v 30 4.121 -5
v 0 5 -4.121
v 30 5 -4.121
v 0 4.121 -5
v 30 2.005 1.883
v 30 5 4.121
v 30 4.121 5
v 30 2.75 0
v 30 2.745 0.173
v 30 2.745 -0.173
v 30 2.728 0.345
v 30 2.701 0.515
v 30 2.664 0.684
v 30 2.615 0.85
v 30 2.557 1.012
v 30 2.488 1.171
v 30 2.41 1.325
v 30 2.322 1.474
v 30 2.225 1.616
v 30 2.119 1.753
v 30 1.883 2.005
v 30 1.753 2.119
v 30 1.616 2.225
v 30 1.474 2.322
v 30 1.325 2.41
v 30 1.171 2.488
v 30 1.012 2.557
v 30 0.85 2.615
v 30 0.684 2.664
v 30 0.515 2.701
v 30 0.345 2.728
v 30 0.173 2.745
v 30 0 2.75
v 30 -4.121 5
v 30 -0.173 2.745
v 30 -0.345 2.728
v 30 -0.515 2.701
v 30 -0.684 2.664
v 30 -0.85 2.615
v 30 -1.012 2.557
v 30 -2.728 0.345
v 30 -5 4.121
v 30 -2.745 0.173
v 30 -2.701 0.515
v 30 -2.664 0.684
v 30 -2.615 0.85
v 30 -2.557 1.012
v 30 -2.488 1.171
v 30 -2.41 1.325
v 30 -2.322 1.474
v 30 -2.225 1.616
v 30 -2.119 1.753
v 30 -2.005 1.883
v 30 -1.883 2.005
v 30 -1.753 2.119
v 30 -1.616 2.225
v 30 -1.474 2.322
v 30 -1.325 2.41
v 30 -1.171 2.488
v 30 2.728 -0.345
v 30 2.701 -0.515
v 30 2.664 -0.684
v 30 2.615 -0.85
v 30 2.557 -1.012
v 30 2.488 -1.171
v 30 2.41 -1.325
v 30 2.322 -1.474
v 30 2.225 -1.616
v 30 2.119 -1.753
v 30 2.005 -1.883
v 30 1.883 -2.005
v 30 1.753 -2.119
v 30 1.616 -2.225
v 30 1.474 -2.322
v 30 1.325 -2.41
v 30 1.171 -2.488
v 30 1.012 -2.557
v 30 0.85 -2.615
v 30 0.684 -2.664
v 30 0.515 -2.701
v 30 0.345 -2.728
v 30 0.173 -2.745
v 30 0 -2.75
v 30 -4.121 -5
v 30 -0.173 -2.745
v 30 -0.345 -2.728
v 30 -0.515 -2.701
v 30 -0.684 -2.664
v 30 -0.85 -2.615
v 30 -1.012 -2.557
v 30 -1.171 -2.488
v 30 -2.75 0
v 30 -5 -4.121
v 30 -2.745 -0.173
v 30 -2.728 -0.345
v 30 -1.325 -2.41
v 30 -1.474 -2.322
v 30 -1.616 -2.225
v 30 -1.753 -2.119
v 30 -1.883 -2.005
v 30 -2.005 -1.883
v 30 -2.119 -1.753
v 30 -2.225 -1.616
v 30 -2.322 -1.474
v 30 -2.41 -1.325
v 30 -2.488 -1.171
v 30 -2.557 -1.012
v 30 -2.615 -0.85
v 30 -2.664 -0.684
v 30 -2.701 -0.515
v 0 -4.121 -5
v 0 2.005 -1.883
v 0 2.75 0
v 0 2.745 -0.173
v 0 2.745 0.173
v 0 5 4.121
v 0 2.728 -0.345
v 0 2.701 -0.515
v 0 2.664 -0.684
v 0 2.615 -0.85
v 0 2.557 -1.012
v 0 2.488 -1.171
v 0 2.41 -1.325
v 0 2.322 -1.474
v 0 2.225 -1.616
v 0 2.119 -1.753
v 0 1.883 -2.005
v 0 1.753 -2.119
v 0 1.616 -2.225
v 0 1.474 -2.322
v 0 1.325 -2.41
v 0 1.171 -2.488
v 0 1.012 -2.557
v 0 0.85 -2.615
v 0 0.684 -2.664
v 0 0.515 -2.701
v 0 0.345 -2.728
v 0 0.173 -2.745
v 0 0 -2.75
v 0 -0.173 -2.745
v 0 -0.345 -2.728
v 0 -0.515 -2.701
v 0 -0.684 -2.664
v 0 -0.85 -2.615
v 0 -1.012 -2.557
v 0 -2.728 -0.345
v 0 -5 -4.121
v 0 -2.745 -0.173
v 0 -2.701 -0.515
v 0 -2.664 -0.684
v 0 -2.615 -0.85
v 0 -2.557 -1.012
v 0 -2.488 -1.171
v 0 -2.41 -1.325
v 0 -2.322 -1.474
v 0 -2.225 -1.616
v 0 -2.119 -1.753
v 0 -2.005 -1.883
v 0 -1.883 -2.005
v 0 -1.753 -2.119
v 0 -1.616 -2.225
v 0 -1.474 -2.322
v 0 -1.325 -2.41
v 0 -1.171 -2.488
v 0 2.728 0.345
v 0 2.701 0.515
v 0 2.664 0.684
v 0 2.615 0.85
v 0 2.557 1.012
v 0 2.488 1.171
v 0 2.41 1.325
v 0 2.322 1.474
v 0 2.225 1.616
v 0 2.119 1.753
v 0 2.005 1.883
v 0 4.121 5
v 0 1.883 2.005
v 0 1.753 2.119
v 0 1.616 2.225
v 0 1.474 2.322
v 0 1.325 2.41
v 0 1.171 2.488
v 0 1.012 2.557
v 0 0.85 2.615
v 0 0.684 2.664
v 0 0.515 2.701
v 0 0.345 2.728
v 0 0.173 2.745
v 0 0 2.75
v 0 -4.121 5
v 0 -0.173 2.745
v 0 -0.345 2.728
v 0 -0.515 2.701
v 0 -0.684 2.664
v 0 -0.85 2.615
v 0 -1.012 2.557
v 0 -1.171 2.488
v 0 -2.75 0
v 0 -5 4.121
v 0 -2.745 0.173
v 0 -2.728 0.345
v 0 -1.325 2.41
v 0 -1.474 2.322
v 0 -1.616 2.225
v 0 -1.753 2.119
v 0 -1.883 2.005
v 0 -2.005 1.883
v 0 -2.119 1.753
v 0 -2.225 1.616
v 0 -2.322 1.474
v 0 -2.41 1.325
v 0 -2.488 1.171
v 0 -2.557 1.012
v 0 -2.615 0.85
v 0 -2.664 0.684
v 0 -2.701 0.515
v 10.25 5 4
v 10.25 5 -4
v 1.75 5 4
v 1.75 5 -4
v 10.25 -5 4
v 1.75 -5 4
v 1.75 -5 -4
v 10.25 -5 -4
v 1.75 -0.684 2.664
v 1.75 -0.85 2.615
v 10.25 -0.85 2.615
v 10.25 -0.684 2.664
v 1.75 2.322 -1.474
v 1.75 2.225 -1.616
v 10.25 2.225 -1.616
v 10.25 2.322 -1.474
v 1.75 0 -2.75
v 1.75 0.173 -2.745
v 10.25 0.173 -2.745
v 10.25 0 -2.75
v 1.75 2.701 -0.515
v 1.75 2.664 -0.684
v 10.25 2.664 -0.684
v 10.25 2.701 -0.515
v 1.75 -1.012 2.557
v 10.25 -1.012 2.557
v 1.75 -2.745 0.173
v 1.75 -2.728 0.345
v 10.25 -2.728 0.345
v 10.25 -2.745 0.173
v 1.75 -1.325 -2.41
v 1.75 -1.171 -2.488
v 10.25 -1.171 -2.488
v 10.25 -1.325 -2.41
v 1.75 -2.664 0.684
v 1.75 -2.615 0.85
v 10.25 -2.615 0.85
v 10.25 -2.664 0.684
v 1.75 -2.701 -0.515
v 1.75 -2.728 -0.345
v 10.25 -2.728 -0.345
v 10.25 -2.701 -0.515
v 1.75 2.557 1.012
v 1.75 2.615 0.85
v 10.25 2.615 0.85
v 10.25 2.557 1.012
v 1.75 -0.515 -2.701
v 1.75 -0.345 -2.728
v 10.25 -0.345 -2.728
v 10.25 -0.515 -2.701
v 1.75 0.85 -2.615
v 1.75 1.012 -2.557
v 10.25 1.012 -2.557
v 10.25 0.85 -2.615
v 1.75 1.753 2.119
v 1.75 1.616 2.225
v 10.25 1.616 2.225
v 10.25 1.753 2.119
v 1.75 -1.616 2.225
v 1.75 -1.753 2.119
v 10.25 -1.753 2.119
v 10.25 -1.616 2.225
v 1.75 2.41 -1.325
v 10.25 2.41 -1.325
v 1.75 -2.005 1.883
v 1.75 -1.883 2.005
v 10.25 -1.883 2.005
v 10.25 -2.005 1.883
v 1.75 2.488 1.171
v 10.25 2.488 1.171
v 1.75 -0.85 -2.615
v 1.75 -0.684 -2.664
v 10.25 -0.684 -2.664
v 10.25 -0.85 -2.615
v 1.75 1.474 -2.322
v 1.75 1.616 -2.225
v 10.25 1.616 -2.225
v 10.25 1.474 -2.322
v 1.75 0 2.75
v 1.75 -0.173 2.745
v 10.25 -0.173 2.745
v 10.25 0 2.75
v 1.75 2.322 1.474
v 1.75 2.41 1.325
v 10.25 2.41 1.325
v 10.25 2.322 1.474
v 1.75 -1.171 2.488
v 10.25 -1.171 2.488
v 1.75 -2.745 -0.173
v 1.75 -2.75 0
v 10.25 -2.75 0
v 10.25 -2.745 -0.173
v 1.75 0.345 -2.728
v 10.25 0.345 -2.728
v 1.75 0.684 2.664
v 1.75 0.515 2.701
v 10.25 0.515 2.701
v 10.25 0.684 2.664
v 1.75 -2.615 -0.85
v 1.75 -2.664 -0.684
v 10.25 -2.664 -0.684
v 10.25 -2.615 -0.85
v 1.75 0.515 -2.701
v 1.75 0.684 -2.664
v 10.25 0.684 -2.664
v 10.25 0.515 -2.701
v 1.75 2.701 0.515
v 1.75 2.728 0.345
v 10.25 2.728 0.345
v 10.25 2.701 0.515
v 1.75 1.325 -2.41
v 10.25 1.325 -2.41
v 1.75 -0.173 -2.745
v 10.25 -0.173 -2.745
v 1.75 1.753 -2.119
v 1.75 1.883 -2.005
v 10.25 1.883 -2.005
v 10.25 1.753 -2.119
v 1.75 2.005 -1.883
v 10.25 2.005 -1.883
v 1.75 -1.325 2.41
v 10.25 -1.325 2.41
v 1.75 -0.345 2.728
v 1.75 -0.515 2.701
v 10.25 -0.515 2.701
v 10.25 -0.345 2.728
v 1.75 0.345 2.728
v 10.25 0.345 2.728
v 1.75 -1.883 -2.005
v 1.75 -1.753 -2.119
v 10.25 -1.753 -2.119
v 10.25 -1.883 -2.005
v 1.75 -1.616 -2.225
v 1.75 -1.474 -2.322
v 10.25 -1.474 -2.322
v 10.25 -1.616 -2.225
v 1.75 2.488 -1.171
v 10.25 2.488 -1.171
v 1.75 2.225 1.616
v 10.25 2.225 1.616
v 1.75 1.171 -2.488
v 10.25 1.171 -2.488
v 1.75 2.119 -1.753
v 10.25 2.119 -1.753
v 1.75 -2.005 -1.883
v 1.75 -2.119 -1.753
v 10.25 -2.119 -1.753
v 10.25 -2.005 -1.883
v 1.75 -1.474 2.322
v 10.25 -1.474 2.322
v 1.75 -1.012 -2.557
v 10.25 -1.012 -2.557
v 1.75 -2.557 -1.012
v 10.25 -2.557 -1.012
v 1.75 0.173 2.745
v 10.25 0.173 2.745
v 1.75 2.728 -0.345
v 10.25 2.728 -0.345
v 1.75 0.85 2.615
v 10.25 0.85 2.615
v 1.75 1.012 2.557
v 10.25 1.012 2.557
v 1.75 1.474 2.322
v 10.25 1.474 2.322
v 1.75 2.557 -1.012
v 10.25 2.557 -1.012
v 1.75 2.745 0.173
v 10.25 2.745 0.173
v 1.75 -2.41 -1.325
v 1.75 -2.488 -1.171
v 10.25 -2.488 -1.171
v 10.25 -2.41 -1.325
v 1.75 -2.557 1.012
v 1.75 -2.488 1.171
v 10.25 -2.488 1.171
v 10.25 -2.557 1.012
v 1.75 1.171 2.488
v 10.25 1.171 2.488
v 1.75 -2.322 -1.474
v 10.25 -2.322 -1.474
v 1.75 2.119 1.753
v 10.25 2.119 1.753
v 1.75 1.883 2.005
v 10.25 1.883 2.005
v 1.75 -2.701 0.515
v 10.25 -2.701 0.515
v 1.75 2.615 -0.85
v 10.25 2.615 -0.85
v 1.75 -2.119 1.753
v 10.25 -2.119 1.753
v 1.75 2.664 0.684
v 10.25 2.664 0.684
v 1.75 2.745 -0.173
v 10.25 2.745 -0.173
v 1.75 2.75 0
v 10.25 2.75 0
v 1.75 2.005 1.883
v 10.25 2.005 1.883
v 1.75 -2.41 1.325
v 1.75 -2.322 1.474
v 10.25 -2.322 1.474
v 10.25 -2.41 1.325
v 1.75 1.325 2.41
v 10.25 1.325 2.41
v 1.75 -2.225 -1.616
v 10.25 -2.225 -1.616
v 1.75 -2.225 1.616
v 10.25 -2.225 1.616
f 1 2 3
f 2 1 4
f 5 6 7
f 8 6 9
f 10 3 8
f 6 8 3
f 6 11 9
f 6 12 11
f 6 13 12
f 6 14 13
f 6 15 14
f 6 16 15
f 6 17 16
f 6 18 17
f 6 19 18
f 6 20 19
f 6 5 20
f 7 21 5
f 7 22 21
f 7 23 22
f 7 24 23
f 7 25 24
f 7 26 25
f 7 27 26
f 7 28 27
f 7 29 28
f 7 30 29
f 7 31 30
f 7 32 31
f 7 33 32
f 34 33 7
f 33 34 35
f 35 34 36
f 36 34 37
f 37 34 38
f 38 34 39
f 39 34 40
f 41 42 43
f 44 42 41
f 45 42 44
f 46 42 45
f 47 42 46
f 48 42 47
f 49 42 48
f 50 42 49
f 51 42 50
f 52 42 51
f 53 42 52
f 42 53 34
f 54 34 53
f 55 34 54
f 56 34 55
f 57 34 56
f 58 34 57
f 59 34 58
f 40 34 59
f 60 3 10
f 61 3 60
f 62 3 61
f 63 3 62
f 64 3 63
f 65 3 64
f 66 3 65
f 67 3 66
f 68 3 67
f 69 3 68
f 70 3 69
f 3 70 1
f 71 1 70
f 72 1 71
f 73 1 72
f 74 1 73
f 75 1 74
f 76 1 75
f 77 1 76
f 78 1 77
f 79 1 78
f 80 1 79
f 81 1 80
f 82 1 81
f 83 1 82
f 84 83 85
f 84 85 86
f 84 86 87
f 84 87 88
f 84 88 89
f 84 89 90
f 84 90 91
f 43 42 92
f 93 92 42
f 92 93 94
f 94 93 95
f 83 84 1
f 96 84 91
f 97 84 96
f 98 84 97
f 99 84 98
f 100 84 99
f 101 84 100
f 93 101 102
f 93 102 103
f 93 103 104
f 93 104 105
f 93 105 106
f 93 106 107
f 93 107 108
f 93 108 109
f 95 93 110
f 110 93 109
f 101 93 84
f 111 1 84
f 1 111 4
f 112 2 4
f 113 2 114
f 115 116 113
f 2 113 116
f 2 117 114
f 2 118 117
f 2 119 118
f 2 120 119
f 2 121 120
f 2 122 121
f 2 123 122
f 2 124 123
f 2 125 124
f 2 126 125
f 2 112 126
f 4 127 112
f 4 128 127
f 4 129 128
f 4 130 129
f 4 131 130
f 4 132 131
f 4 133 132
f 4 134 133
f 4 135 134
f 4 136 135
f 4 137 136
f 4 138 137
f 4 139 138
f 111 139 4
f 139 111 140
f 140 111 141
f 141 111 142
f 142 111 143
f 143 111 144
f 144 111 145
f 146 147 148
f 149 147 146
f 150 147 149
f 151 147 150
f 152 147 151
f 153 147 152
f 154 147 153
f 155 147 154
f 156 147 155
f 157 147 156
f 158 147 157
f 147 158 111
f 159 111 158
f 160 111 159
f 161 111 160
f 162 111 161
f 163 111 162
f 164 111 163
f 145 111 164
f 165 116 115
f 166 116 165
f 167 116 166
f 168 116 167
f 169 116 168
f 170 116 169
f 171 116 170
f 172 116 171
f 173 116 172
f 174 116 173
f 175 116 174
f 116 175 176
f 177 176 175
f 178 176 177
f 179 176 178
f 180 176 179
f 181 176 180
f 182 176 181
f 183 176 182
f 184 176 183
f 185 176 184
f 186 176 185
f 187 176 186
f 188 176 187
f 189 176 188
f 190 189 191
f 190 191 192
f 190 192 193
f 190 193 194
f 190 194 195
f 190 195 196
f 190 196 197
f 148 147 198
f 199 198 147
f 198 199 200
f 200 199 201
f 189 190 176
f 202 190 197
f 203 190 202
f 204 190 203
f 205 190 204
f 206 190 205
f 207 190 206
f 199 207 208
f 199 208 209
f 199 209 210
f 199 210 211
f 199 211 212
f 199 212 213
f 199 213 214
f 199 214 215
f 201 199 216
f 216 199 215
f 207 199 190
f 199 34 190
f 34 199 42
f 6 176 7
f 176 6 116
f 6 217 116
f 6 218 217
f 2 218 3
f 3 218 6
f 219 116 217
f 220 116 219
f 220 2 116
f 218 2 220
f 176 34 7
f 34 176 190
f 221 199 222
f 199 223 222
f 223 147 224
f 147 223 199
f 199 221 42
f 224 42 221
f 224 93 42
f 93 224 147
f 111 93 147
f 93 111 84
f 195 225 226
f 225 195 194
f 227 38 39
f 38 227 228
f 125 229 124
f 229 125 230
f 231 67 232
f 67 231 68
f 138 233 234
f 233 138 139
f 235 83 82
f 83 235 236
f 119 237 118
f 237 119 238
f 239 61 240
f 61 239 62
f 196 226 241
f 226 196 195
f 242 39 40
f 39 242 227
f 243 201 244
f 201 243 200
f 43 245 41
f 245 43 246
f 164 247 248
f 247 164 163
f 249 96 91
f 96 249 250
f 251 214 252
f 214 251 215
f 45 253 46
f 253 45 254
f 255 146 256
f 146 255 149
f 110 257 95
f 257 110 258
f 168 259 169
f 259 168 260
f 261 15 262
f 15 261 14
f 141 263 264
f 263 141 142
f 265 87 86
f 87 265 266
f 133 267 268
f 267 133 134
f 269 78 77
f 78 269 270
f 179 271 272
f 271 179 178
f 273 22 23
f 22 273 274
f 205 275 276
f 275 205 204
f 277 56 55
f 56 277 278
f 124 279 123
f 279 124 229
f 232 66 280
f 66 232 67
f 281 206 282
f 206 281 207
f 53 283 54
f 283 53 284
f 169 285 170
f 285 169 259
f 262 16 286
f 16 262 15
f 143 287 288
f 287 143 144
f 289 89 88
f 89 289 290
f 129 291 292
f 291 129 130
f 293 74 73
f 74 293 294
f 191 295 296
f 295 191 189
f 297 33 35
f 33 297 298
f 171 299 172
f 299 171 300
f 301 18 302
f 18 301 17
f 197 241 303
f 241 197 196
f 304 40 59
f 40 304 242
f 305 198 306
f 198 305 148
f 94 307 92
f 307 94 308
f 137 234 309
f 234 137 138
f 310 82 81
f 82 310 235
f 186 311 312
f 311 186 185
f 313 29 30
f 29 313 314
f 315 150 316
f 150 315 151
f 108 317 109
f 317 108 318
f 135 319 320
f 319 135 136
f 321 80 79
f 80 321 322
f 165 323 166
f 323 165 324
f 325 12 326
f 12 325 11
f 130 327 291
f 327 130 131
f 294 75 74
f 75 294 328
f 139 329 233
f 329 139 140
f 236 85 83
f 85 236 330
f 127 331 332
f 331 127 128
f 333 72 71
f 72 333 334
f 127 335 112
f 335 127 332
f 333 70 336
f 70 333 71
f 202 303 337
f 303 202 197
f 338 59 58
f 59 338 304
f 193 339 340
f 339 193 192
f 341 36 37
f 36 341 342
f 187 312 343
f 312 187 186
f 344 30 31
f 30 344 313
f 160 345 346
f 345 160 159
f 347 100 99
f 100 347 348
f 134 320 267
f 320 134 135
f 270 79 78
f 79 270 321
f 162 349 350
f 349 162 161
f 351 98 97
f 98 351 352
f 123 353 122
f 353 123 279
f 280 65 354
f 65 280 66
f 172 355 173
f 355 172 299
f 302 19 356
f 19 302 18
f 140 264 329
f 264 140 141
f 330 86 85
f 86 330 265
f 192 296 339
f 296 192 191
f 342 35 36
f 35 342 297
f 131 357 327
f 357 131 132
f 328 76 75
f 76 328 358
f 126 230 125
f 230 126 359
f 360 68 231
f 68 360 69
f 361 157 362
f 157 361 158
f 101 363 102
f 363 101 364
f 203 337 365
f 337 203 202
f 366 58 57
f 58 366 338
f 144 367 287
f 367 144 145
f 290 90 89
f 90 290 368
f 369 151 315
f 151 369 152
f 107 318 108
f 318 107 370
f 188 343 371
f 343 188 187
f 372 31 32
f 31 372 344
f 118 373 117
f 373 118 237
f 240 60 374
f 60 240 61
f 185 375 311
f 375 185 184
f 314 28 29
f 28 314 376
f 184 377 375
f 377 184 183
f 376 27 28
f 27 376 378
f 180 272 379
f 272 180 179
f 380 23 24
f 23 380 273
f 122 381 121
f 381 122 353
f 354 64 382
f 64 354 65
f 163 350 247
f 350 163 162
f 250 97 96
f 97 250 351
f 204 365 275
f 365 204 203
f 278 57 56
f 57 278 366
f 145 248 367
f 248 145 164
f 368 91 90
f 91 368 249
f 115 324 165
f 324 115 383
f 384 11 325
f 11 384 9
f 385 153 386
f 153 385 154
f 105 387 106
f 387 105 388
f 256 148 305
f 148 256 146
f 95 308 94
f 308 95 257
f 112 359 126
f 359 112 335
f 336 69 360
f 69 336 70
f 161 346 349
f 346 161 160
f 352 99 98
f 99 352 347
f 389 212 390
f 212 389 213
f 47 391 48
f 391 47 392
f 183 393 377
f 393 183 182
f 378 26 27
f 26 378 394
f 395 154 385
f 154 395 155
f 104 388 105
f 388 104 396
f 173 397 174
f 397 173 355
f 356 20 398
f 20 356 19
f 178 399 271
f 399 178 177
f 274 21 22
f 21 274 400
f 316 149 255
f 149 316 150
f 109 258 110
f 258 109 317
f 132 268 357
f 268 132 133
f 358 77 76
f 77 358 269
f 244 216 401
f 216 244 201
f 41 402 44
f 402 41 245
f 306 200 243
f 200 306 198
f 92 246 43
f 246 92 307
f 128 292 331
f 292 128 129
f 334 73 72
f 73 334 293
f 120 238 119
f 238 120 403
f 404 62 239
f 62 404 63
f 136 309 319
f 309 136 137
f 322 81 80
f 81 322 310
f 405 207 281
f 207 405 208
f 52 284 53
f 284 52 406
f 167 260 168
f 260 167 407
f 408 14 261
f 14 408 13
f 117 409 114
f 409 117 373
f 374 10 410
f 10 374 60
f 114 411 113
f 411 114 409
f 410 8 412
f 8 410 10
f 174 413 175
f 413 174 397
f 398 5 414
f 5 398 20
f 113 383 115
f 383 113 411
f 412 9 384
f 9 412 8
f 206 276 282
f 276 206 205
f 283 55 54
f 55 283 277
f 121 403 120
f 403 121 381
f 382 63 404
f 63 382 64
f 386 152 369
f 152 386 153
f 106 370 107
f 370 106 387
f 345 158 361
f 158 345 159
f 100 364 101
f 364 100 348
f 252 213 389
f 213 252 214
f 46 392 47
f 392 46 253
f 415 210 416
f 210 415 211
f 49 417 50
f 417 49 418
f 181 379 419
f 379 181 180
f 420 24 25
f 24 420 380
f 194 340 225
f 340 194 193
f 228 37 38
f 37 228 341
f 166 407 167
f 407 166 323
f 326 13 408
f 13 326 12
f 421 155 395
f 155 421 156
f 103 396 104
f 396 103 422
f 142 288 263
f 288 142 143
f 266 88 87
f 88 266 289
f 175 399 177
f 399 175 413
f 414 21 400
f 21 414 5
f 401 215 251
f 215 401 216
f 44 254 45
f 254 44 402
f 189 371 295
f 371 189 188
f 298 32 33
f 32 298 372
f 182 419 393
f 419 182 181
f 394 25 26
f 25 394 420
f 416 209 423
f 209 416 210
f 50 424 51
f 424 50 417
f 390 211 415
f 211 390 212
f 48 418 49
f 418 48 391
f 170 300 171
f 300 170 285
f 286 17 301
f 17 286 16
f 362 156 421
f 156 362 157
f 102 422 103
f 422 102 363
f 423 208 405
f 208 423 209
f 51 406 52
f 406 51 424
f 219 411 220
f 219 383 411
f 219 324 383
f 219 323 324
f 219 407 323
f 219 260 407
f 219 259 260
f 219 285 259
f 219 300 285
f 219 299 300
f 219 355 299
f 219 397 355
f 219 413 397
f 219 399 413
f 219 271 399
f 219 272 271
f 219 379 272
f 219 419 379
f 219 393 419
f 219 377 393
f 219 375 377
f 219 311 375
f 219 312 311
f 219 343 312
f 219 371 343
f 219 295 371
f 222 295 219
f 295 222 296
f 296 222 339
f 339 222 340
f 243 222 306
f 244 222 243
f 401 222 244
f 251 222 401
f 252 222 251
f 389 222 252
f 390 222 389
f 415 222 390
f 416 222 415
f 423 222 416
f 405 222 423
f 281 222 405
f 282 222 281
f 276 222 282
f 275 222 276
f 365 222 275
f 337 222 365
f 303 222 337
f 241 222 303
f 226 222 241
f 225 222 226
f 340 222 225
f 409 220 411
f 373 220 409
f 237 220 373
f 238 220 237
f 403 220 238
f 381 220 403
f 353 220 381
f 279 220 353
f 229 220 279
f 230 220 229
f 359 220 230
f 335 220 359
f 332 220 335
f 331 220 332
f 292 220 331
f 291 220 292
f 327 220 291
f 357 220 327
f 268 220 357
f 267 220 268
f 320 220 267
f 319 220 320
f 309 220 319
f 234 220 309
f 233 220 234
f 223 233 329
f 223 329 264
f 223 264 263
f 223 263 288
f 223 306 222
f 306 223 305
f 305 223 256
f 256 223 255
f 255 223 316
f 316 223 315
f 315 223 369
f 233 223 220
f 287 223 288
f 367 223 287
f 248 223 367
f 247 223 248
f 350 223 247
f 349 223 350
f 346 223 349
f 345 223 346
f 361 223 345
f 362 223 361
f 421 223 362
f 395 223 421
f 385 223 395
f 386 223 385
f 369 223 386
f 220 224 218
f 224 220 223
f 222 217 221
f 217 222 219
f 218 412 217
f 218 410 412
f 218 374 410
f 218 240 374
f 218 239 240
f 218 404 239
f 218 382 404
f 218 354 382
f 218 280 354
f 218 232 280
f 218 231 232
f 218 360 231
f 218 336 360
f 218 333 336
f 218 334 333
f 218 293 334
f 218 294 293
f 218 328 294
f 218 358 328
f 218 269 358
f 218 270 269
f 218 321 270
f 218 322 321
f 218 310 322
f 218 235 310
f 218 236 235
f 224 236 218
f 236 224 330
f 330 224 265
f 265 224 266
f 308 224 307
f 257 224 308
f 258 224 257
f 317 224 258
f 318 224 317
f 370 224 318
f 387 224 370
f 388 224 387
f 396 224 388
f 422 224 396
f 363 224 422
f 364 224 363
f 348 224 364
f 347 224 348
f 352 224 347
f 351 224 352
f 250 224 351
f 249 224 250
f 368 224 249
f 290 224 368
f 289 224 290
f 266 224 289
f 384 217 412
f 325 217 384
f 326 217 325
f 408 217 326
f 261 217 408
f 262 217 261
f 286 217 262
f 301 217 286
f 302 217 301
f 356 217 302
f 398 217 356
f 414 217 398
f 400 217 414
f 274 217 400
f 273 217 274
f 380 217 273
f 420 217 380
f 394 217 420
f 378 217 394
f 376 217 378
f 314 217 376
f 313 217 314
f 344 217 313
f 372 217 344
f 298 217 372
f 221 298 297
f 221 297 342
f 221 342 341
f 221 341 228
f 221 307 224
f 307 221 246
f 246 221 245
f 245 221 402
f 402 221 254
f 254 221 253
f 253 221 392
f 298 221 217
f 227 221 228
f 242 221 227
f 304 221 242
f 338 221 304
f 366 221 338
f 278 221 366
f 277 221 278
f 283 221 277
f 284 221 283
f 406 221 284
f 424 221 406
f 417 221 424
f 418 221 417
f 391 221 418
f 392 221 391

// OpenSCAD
// Written by Volksswitch <www.volksswitch.org>
//
// To the extent possible under law, the author(s) have dedicated all
// copyright and related and neighboring rights to this software to the
// public domain worldwide. This software is distributed without any
// warranty.
//
// You should have received a copy of the CC0 Public Domain
// Dedication along with this software.
// If not, see <http://creativecommons.org/publicdomain/zero/1.0/>.
//
//
//------------------------------------------------------------------
// User Inputs
//------------------------------------------------------------------

/*[Part to Print]*/
part = "stylus tip"; // [stylus tip,stylus extender,stylus ring,finger/toe ring]

/*[Stylus Info]*/
stylus_width = 10; // [8:15]
conduction_type="bolt and nut"; //[bolt and nut,conductive filament]

/*[---Conductive Stylus Info]*/
stylus_extender_or_stylus_tip_length = 20; //[10:200]
// stylus width must be at least 10
use_4mm_nut_to_mount_tip="no"; //[yes,no]

/*[---Bolted Stylus Info]*/
bolt_length = 25; //[20, 25, 30, 35, 40, 45, 50, 55, 60, 65, 70, 75, 80]
coupling_nut_length = 8; //[8,15]

/*[Sixth Finger/Toe Ring Info]*/
finger_or_toe_diameter=20; //[10:30]
ring_width=10; //[4:15]
stylus_ring_type = "finger ring opposite stylus"; //[finger ring opposite stylus, finger ring next to stylus, two finger rings]
finger_ring_type = "single finger ring"; //[single finger ring, mount for second finger ring]

/*[Hidden]*/
// /*[Part to Print]*/
// part = "palm loop"; // [---Palm Loop---,palm loop,turret,thumb loop,circular grip,--- Stylus---,stylus extender,stylus tip,---Sixth Finger/Toe---,stylus ring,single finger ring,---Utensil/Pen Holder---,utensil/pen holder]


//Customizer Values for Other Implementations
// /*[Palm Loop Info]*/
palm_loop_height = 30; // [15:75]
palm_loop_length = 80; // [45:125]
palm_loop_width = 8; // [7:15]
include_stylus_mount = "yes"; // [yes,no]
include_thumb_rest = "no"; // [yes,no]
include_thumb_loop_mount = "no"; // [yes,no]
thumb_loop_diameter = 20; //[10:30]
thumb_loop_width=8; // [4:10]
circular_grip_diameter=15; //[10:40]
include_utensil_mount = "no"; // [yes,no]

// /*[Utensil/Pen Holder Info]*/
utensil_width = 10; //[2:30]
utensil_height = 3; //[2:30]
utensil_handle_length=80; //[45:150]
pen_diameter=10; //[5:30]
pen_handle_length=80; //[45:150]
holder_type="fork or spoon"; //[fork or spoon,knife,pen]


//general variables
fudge = 0.005;
chamfer_size=1.5;

//palm loop variables
palm_loop_delta_offset = 3;

//utensil holder variables
utensil_handle_width = (holder_type != "pen") ? utensil_width+4 : pen_diameter+4;
utensil_handle_height = (holder_type != "pen") ? utensil_height+4 : pen_diameter+4;
uhl = (holder_type != "pen") ? utensil_handle_length : pen_handle_length;
v_depth = 1;
gap_width = uhl - 22 - 17;

//stylus variables
$fn=100;
stylus_tip_thread_diameter = 5; //[4:6]
stylus_tip_hole_scale_factor = 100; //[90:110]
dove_tail_length = stylus_width+2;
stylus_post_delta_offset = 1.5;
stylus_diameter = (stylus_tip_thread_diameter-0.1)*stylus_tip_hole_scale_factor/100;
x_offset = palm_loop_length*(-0.1354) + 13.5;
stylus_mount_width = 15; //******************what's this???***************************
seostl = (conduction_type=="conductive filament") ? stylus_extender_or_stylus_tip_length :
			(conduction_type=="bolt and nut" && coupling_nut_length==8) ? bolt_length + 5 :
			bolt_length + 10;

			

//turret variables
leg = stylus_width*cos(30);

//ring variables
fotd = (part=="stylus ring" && conduction_type=="bolt and nut") ? finger_or_toe_diameter+1 : finger_or_toe_diameter; // add 1 mm to accomodate head of bolt
ring_thickness = 4;
ring_inner_diameter = (part=="thumb loop") ? thumb_loop_diameter : fotd;
ring_outer_diameter = ring_inner_diameter+ring_thickness;


//-------- Main Program-----------


if(part=="palm loop"){
	palm_loop();
}
else if(part=="turret"){
    if(stylus_width<9) four_sided_turret(); else six_sided_turret();
}
else if(part=="thumb loop"){
	thumb_loop();
}
else if(part=="circular grip"){
	circular_grip();
}
else if (part=="stylus extender" || part=="stylus tip"){
	stylus_post_and_tip();
}
else if(part=="stylus ring"){
	stylus_ring();
}
else if(part=="finger/toe ring"){
	finger_or_toe_ring();
}
else if(part=="utensil/pen holder"){
	utensil_holder();
}


//--------- Modules --------------

module palm_loop(){
	difference(){
		union(){
			//chamfer outside of palm loop
			outer_chamfered_object("outer palm",palm_loop_width,0,0);//shape_type,shape_height,shape_width,shape_length
			
			//add palm loop mounts		
			if(include_stylus_mount=="yes") pointer_mount();
			
			//only one type of thumb mount allowed at a time
			if(include_thumb_loop_mount=="yes" && include_thumb_rest=="no") thumb_loop_mount();	
			if(include_thumb_rest=="yes" && include_thumb_loop_mount=="no") thumb_rest_mount();

			//utensil mount cannot be used with thumb loop mount
			if(include_utensil_mount=="yes" && include_thumb_loop_mount=="no") utensil_mount();
		}
		//chamfer inside of palm loop
		inner_chamfered_object("inner palm",palm_loop_width,0,0); //shape_type,shape_height,shape_width,shape_length
		
		//add dove tail cuts in pointer mount
		if(include_stylus_mount == "yes") pointer_mount_slots();
		
		//add dove tail cuts in thumb loop mount
		if(include_thumb_loop_mount=="yes" && include_utensil_mount=="no") thumb_loop_slots();

		//add dove tail cuts in utensil mount
		if(include_utensil_mount=="yes" && include_thumb_loop_mount=="no") utensil_mount_slots();
	}
}

module thumb_loop(){
	difference(){
		union(){
			outer_chamfered_object("outer ring",thumb_loop_width,0,0);
			
			translate([-4,thumb_loop_diameter/2,-thumb_loop_width/2])
			cube([8,2,thumb_loop_width]);
			
			translate([0,thumb_loop_diameter/2+2,0])
			rotate([0,0,90])
			dove_tail(0,thumb_loop_width,2);
		}
		inner_chamfered_object("inner ring",thumb_loop_width,0,0);
	}
}

module utensil_holder(){
echo("here");
	if(holder_type=="fork or spoon"){
		difference(){
			base_utensil_holder(utensil_handle_width,utensil_handle_height);
			translate([uhl/2-1-fudge,utensil_height/2+2,0])
			cube([uhl-2,utensil_height,utensil_width],true);
		}
		
		translate([0,-2+fudge,-utensil_handle_width/2])
		linear_extrude(height=utensil_handle_width)
		polygon([[22,utensil_handle_height],[22+gap_width,utensil_handle_height],[22+gap_width/2,utensil_handle_height-1]]);
	}
	else if(holder_type=="knife"){
		translate([0,utensil_handle_height/2,utensil_handle_width/2])
		rotate([-90,0,0])
		union(){
			difference(){
				base_utensil_holder(utensil_handle_height,utensil_handle_width);
				translate([uhl/2-1-fudge,utensil_width/2+2,0])
				cube([uhl-2,utensil_width,utensil_height],true);
			}
				
			translate([0,-2+fudge,-utensil_handle_height/2])
			linear_extrude(height=utensil_handle_height)
			polygon([[22,utensil_handle_width],[22+gap_width,utensil_handle_width],[22+gap_width/2,utensil_handle_width-1]]);
			
			translate([15,0,0])
			difference(){
				outer_chamfered_object("box",utensil_handle_height,utensil_handle_width,gap_width+10); //shape_type,shape_height,shape_width,shape_length
				translate([(gap_width+10)/2,utensil_handle_width/2,-2])
				cube([gap_width+10,utensil_handle_width+fudge,utensil_handle_height+fudge],true);
			}
		}
	}
	else if(holder_type=="pen"){
		difference(){
			base_utensil_holder(utensil_handle_width,utensil_handle_height);
			translate([2+fudge,pen_diameter/2+2,0])
			rotate([0,90,0])
			cylinder(h=pen_handle_length-2,d=pen_diameter);

translate([utensil_handle_length-18,utensil_handle_width/2-1,utensil_handle_width/4])
cube([19,2,utensil_handle_width/2]);
		}
		
		translate([0,-2+fudge,-utensil_handle_width/2])
		linear_extrude(height=utensil_handle_width)
		polygon([[22,utensil_handle_height],[22+gap_width,utensil_handle_height],[22+gap_width/2,utensil_handle_height-1]]);
	}

	utensil_holder_dove_tails();
}

module base_utensil_holder(utensil_handle_width,utensil_handle_height){
	//two pockets for holding untensil with gap inbetween
	outer_chamfered_object("box",utensil_handle_width,utensil_handle_height,22); //shape_type,shape_height,shape_width,shape_length
	translate([22+gap_width,0,0])
	outer_chamfered_object("box",utensil_handle_width,utensil_handle_height,17); //shape_type,shape_height,shape_width,shape_length
	
	//side cover that will be where the dove tails mount when used for forks and spoons
	translate([15,0,0])
	difference(){
		outer_chamfered_object("box",utensil_handle_width,utensil_handle_height,gap_width+10); //shape_type,shape_height,shape_width,shape_length
		translate([(gap_width+10)/2,utensil_handle_height/2-2,0])
		cube([gap_width+10,utensil_handle_height+fudge,utensil_handle_width+fudge],true);
	}
}

module stylus_post_and_tip(){
	if (conduction_type=="conductive filament"){
		difference(){
			rotate([0,90,0])
			linear_extrude(height=seostl)
			offset(delta=stylus_post_delta_offset,chamfer=true)
			square([stylus_width-stylus_post_delta_offset*2,stylus_width-stylus_post_delta_offset*2],center=true);
		
			if (part=="stylus tip"){
				//drill hole for stylus tip
				stylus_hole();
				
				//add hole for nut if specified and if stylus is wide enough for a nut
				if (use_4mm_nut_to_mount_tip=="yes" && stylus_width>=10){
					translate([4,0,0])
					cube([4,8,stylus_width+fudge],true);
				}
			}
			else{
			//this is a stylus extender so add a female dove tail rather than a stylus hole
			translate([-fudge,0,0])
			dove_tail(0,stylus_width+fudge,2);
			}
		}
		
		//add male dove tail at one end
		dove_tail(seostl,stylus_width,2);
	}
	else if(part=="stylus tip" && conduction_type=="bolt and nut" && stylus_width>=10){
		difference(){
			rotate([0,90,0])
			linear_extrude(height=seostl)
			offset(delta=stylus_post_delta_offset,chamfer=true)
			square([stylus_width-stylus_post_delta_offset*2,stylus_width-stylus_post_delta_offset*2],center=true);
			
			//drill hole along the length of the stylus wide enough that the bolt can spin freely
			translate([-fudge,0,0])
			rotate([0,90,0])
			cylinder(h=seostl+fudge*2,d=5.5);
			
			if(coupling_nut_length==8){
				rotate([90,0,0])
				translate([6,0,0])
				cube([8.5,8,stylus_width+fudge],true);
			}
			else if(coupling_nut_length==15){
				rotate([90,0,0])
				translate([9.5,0,0])
				cube([15,8,stylus_width+fudge],true);
			}
		}
	}
}

module dove_tail(offset,dove_tail_length,dove_tail_width){
    translate([offset,0,-dove_tail_length/2])
    linear_extrude(height=dove_tail_length)
    polygon(points=[[0,-dove_tail_width/2],[2,-dove_tail_width],[2,dove_tail_width],[0,dove_tail_width/2]]);
}

module prism(width,length){
    translate([0,0,-length/2])
    linear_extrude(height=length)
    polygon(points=[[0,0],[0,width],[width,0]]);
}

module stylus_hole(){
    rotate([0,90,0])
    translate([0,0,2.5])
    cylinder(d=stylus_diameter,h = 5.1,center=true);
}

module six_sided_turret(){
    difference(){
        translate([0,0,-stylus_width/2])
        cylinder(h=stylus_width+2,r=stylus_width,$fn=6);
        
        rotate([0,0,30])
        dove_tail(-leg-0.01,stylus_width,2);
        rotate([0,0,90])
        dove_tail(-leg-0.01,stylus_width,2);
        rotate([0,0,150])
        dove_tail(-leg-0.01,stylus_width,2);
        rotate([0,0,210])
        dove_tail(-leg-0.01,stylus_width,2);
        rotate([0,0,270])
        dove_tail(-leg-0.01,stylus_width,2);
        rotate([0,0,330])
        dove_tail(-leg-0.01,stylus_width,2);
    }
    translate([0,0,stylus_width/2+2])
    
    rotate([0,0,90])
    rotate([0,-90,0])
    dove_tail(0,stylus_width,4);
        
}

module four_sided_turret(){
    difference(){
        translate([0,0,-stylus_width/2])
        // cube([stylus_width+2,stylus_width+2,stylus_width+2],center=true);
        linear_extrude(height=stylus_width+2)
		offset(delta=1.5,chamfer=true)
		square([stylus_width-1,stylus_width-1],center=true);
        
        rotate([0,0,0])
        dove_tail(-stylus_width+3,stylus_width,2);
        rotate([0,0,90])
        dove_tail(-stylus_width+3,stylus_width,2);
        rotate([0,0,180])
        dove_tail(-stylus_width+3,stylus_width,2);
        rotate([0,0,270])
        dove_tail(-stylus_width+3,stylus_width,2);
    }
    translate([0,0,stylus_width/2+2])
    
    rotate([0,0,90])
    rotate([0,-90,0])
    dove_tail(0,stylus_width,4);
        
}

module palm_shape(palm_loop_delta_offset){
	offset(delta=palm_loop_delta_offset)
	resize([palm_loop_length,palm_loop_height,0])
	basic_palm_shape();
}

module pointer_mount(){
	translate([-9,palm_loop_height-3.5,palm_loop_width/2])	
	rotate([-90,0,0])
	outer_chamfered_object("box",15+palm_loop_delta_offset,palm_loop_width,48);
}

module pointer_mount_slots(){
	translate([-2,palm_loop_height+palm_loop_delta_offset+2.5+fudge,-palm_loop_width]) pointer_mount_channel(8,2);
	translate([32,palm_loop_height+palm_loop_delta_offset+2.5+fudge,-palm_loop_width]) pointer_mount_channel(8,2);
}

module pointer_mount_channel(stylus_width,depth){ //8,2
	linear_extrude(palm_loop_width*2)
	polygon(points=[[-stylus_width/2,-depth],[stylus_width/2,-depth],[stylus_width/4,0],[-stylus_width/4,0]]);
}

module utensil_mount(){
	translate([-9,palm_loop_delta_offset+1,palm_loop_width/2])	
	rotate([-90,0,0])
	outer_chamfered_object("box",12+palm_loop_delta_offset,palm_loop_width,48);
}

module utensil_mount_slots(){
	translate([-2,-palm_loop_delta_offset-0.5-fudge,-palm_loop_width]) utensil_mount_channel(8,2);
	translate([32,-palm_loop_delta_offset-0.5-fudge,-palm_loop_width]) utensil_mount_channel(8,2);
}

module utensil_mount_channel(stylus_width,depth){ //8,2
	rotate([0,0,180])
	linear_extrude(palm_loop_width*2)
	polygon(points=[[-stylus_width/2,-depth],[stylus_width/2,-depth],[stylus_width/4,0],[-stylus_width/4,0]]);
}

module utensil_holder_dove_tails(){
	difference(){
		union(){
			translate([6,utensil_handle_height,0]) utensil_holder_dove_tail(8,2);
			translate([40,utensil_handle_height,0]) utensil_holder_dove_tail(8,2);
		}
		translate([uhl/2,utensil_handle_height+2+fudge,-utensil_handle_width/2-fudge])
		rotate([180,0,0])
		rotate([0,90,0])
		prism(2+chamfer_size/2,uhl );
		
		translate([uhl/2,utensil_handle_height+2+fudge,utensil_handle_width/2+fudge])
		rotate([-90,0,0])
		rotate([0,90,0])
		prism(2+chamfer_size/2,uhl );

	}
}

module utensil_holder_dove_tail(stylus_width,depth){ //8,2
	dove_tail_length=utensil_handle_width;
	translate([0,0,-dove_tail_length/2])
	rotate([0,0,180])
	linear_extrude(height=dove_tail_length)
	polygon(points=[[-stylus_width/2,-depth],[stylus_width/2,-depth],[stylus_width/4,0],[-stylus_width/4,0]]);
}

module thumb_loop_mount(){
	translate([x_offset,19,0])
	outer_chamfered_object("thumb loop mount",palm_loop_width,0,0); //shape_type,shape_height,shape_width,shape_length
}

module thumb_rest_mount(){
	translate([-palm_loop_length/2,-palm_loop_delta_offset/2,-palm_loop_width/2])
	rotate([90,0,0])
	outer_chamfered_object("box",palm_loop_delta_offset,palm_loop_width,palm_loop_length/2);

	translate([-palm_loop_length/2+palm_loop_delta_offset-1.175,-palm_loop_delta_offset/2-0.3,-palm_loop_width/2])
	rotate([0,0,105])
	rotate([90,0,0])
	outer_chamfered_object("box",palm_loop_delta_offset,palm_loop_width,palm_loop_height/2);
}

module thumb_loop_slots(){
        //bottom slots
		translate([x_offset-6,-4-fudge,palm_loop_width/2])
		rotate([0,0,90])
		dove_tail(0,palm_loop_width*2,2);
		
        translate([x_offset+3,-4-fudge,palm_loop_width/2])
		rotate([0,0,90])
		dove_tail(0,palm_loop_width*2,2);
		
        translate([x_offset+12,-4-fudge,palm_loop_width/2])
		rotate([0,0,90])
		dove_tail(0,palm_loop_width*2,2);
		
		//angled slots
		translate([x_offset-16.8-fudge,2,palm_loop_width/2])
		rotate([0,0,30])
		dove_tail(0,palm_loop_width*2,2);

		translate([x_offset-20.8,9,palm_loop_width/2])
		rotate([0,0,30])
		dove_tail(0,palm_loop_width*2,2);

		//corner slot
		translate([x_offset-12.45-fudge,-2.7-fudge,palm_loop_width/2])
		rotate([0,0,60])
		dove_tail(0,palm_loop_width*2,2);
}

module circular_grip(){
echo(palm_loop_length=palm_loop_length);
	difference(){
		outer_chamfered_object("rod",palm_loop_length-20,0,0);
		translate([circular_grip_diameter/2,0,0])
		cube([6,palm_loop_width+1,palm_loop_length-20+fudge],true);
	}
}

module stylus_ring(){
	difference(){
		union(){
			outer_chamfered_object("outer ring",ring_width,0,0); 
			
			translate([0,fotd/2-.5+5,0])
			rotate([90,0,0])
			linear_extrude(height=5)
            offset(delta=stylus_post_delta_offset,chamfer=true)
            square([stylus_width-stylus_post_delta_offset*2,ring_width-stylus_post_delta_offset*2],center=true);

			
			if (stylus_ring_type=="finger ring next to stylus" || stylus_ring_type=="two finger rings"){
				translate([fotd/2+3.5,-4,-ring_width/2])
				rotate([0,0,90])
				cube([8,4,ring_width]);
			}
			if (stylus_ring_type=="two finger rings"){
				translate([-fotd/2-3.5,4,-ring_width/2])
				rotate([0,0,-90])
				cube([8,4,ring_width]);
			}
			if (stylus_ring_type=="finger ring opposite stylus"){
				translate([-4,-fotd/2-3.5,-ring_width/2])
				cube([8,4,ring_width]);
			}
			
		}
		inner_chamfered_object("inner ring",ring_width,0,0);
		
		
		if(conduction_type=="bolt and nut" && ring_width>=10 && stylus_width>=10){
			translate([0,1,0])
			rotate([-90,0,0])
			cylinder(r=4/cos(30),h=fotd/2+2,$fn=6);
			
			translate([0,fotd/2+1,0])
			rotate([-90,0,0])
			cylinder(d=5,h=4);
			
			translate([0,fotd/2+1.5,ring_width/2])
			cube([5,7,ring_width],true);
		}
		else{
			translate([0,fotd/2+4.5+fudge,0])
			rotate([0,0,-90])
			dove_tail(0,ring_width+fudge,2);
		}
		
		if (stylus_ring_type=="finger ring next to stylus" || stylus_ring_type=="two finger rings"){
			translate([fotd/2+3.5+fudge,0,0])
			rotate([0,0,180])
			dove_tail(0,ring_width+fudge,2);
		}
		if (stylus_ring_type=="two finger rings"){
			translate([-fotd/2-3.5-fudge,0,0])
			rotate([0,0,0])
			dove_tail(0,ring_width+fudge,2);
		}
		if (stylus_ring_type=="finger ring opposite stylus"){
			translate([0,-fotd/2-3.5-fudge,0])
			rotate([0,0,90])
			dove_tail(0,ring_width+fudge,2);
		}
	}	
}

//-------------------------------------------------------------------------------------------

module inner_chamfered_object(shape_type,shape_height,shape_width,shape_length){
    union(){
        translate([0,0,-shape_height/2])
        linear_extrude(height=shape_height)
        shape(shape_type,0,shape_width,shape_length);
        
        half_inner_chamfer(shape_type,shape_height,shape_width,shape_length);
        mirror([0,0,1]) half_inner_chamfer(shape_type,shape_height,shape_width,shape_length);
    }
}

module half_inner_chamfer(shape_type,shape_height,shape_width,shape_length){
    translate([0,0,shape_height/2-chamfer_size/2+fudge])
	hull(){
		translate([0,0,chamfer_size+fudge])
		linear_extrude(height=fudge)
		offset(delta=chamfer_size)
		shape(shape_type,fudge,shape_width,shape_length);
		
		linear_extrude(height = fudge)
		shape(shape_type,fudge,shape_width,shape_length);
   }
}

module outer_chamfered_object(shape_type,shape_height,shape_width,shape_length){
    difference(){
		translate([0,0,-shape_height/2])
        linear_extrude(height=shape_height)
        shape(shape_type,0,shape_width,shape_length);
        
        half_outer_chamfer(shape_type,shape_height,shape_width,shape_length);
        mirror([0,0,1]) half_outer_chamfer(shape_type,shape_height,shape_width,shape_length);
    }
}

module half_outer_chamfer(shape_type,shape_height,shape_width,shape_length){
    translate([0,0,shape_height/2+fudge])
    difference(){
        translate([0,0,-chamfer_size/2])
        linear_extrude(height=chamfer_size)
        shape(shape_type,fudge,shape_width,shape_length);
        
        translate([0,0,-chamfer_size/2-fudge])
        hull(){
            linear_extrude(height = fudge)
            shape(shape_type,fudge,shape_width,shape_length);
            
            translate([0,0,chamfer_size+fudge])
            linear_extrude(height=fudge)
            offset(delta=-chamfer_size)
            shape(shape_type,fudge,shape_width,shape_length);
        }
    }
}

module shape(shape_type,fudge,shape_width,shape_length){
    if(shape_type == "box"){
        translate([chamfer_size,chamfer_size,0])
        offset(delta=chamfer_size,chamfer=true)
        square([shape_length-chamfer_size*2,shape_width+fudge-chamfer_size*2]);	
    }
    else if(shape_type=="rod"){
		outer_diameter = circular_grip_diameter;
        circle(d=outer_diameter+fudge,$fn=100);   
    }
    else if(shape_type=="outer ring"){
        circle(d=ring_outer_diameter+fudge,$fn=100);   
    }
    else if(shape_type=="inner ring"){
        circle(d=ring_inner_diameter+fudge,$fn=100);   
    }
    else if(shape_type=="inner palm"){
		simple_palm(0);
	}
    else if(shape_type=="outer palm"){
		simple_palm(palm_loop_delta_offset);
	}
    else if(shape_type=="thumb loop mount"){
		thumb_loop_mount_shape();
	}
	else{
	}
}

// module simple_palm(pldo){
	// $fn=100;
	// offset(delta=pldo)
	// resize([palm_loop_length,palm_loop_height,0])
	// hull(){
		// //pointer circle
		// translate([0,17.5,0])
		// circle(17.5);

		// //little finger circle
		// translate([65+17.5/2,15,0])
		// circle(15);

		// //back of the hand radius
		// translate([24,-62,0])
		// difference(){
			// circle(100);
			// translate([0,-10,0])
			// square([210,190],center=true);
			// translate([-56,50,0])
			// square([50,100],center=true);
		// }
	// }
// }

module simple_palm(pldo){
	$fn=100;
	pointer_dia=18;
	little_finger_dia=16;
	palm_back_circle_dia=100;
	
	offset(delta=pldo)
	resize([palm_loop_length,palm_loop_height,0])
	hull(){
		//pointer circle
		translate([0,pointer_dia,0])
		circle(pointer_dia);

		//little finger circle
		translate([65+17/2,little_finger_dia,0])
		circle(little_finger_dia);

		//back of the hand radius
		translate([28,-60,0])
		difference(){
			circle(palm_back_circle_dia);
			translate([0,-10,0])
			square([210,190],center=true);
			translate([-56,50,0])
			square([50,100],center=true);
		}
	}
}

module thumb_loop_mount_shape(){
	union(){
		intersection(){
			offset(delta=10,chamfer=true)
			circle(r=15,$fn=6);
			translate([-7,-14,0])
			square([50,20],center=true);
		}
		translate([0,-23,0])
		square([20,10]);
	}
}

module finger_or_toe_ring(){
	difference(){
		union(){
			outer_chamfered_object("outer ring",ring_width,0,0);
			
			translate([-4,fotd/2,-ring_width/2])
			cube([8,2,ring_width]);
			
			translate([0,fotd/2+2,0])
			rotate([0,0,90])
			dove_tail(0,ring_width,2);
			
			if(finger_ring_type=="mount for second finger ring"){
				translate([-4,-fotd/2-3,-ring_width/2])
				cube([8,4,ring_width]);
			}
		}
		inner_chamfered_object("inner ring",ring_width,0,0);
		
		if(finger_ring_type=="mount for second finger ring"){
			translate([0,-fotd/2-3-fudge,0])
			rotate([0,0,90])
			dove_tail(0,ring_width+fudge,2);
		}
	}
}
